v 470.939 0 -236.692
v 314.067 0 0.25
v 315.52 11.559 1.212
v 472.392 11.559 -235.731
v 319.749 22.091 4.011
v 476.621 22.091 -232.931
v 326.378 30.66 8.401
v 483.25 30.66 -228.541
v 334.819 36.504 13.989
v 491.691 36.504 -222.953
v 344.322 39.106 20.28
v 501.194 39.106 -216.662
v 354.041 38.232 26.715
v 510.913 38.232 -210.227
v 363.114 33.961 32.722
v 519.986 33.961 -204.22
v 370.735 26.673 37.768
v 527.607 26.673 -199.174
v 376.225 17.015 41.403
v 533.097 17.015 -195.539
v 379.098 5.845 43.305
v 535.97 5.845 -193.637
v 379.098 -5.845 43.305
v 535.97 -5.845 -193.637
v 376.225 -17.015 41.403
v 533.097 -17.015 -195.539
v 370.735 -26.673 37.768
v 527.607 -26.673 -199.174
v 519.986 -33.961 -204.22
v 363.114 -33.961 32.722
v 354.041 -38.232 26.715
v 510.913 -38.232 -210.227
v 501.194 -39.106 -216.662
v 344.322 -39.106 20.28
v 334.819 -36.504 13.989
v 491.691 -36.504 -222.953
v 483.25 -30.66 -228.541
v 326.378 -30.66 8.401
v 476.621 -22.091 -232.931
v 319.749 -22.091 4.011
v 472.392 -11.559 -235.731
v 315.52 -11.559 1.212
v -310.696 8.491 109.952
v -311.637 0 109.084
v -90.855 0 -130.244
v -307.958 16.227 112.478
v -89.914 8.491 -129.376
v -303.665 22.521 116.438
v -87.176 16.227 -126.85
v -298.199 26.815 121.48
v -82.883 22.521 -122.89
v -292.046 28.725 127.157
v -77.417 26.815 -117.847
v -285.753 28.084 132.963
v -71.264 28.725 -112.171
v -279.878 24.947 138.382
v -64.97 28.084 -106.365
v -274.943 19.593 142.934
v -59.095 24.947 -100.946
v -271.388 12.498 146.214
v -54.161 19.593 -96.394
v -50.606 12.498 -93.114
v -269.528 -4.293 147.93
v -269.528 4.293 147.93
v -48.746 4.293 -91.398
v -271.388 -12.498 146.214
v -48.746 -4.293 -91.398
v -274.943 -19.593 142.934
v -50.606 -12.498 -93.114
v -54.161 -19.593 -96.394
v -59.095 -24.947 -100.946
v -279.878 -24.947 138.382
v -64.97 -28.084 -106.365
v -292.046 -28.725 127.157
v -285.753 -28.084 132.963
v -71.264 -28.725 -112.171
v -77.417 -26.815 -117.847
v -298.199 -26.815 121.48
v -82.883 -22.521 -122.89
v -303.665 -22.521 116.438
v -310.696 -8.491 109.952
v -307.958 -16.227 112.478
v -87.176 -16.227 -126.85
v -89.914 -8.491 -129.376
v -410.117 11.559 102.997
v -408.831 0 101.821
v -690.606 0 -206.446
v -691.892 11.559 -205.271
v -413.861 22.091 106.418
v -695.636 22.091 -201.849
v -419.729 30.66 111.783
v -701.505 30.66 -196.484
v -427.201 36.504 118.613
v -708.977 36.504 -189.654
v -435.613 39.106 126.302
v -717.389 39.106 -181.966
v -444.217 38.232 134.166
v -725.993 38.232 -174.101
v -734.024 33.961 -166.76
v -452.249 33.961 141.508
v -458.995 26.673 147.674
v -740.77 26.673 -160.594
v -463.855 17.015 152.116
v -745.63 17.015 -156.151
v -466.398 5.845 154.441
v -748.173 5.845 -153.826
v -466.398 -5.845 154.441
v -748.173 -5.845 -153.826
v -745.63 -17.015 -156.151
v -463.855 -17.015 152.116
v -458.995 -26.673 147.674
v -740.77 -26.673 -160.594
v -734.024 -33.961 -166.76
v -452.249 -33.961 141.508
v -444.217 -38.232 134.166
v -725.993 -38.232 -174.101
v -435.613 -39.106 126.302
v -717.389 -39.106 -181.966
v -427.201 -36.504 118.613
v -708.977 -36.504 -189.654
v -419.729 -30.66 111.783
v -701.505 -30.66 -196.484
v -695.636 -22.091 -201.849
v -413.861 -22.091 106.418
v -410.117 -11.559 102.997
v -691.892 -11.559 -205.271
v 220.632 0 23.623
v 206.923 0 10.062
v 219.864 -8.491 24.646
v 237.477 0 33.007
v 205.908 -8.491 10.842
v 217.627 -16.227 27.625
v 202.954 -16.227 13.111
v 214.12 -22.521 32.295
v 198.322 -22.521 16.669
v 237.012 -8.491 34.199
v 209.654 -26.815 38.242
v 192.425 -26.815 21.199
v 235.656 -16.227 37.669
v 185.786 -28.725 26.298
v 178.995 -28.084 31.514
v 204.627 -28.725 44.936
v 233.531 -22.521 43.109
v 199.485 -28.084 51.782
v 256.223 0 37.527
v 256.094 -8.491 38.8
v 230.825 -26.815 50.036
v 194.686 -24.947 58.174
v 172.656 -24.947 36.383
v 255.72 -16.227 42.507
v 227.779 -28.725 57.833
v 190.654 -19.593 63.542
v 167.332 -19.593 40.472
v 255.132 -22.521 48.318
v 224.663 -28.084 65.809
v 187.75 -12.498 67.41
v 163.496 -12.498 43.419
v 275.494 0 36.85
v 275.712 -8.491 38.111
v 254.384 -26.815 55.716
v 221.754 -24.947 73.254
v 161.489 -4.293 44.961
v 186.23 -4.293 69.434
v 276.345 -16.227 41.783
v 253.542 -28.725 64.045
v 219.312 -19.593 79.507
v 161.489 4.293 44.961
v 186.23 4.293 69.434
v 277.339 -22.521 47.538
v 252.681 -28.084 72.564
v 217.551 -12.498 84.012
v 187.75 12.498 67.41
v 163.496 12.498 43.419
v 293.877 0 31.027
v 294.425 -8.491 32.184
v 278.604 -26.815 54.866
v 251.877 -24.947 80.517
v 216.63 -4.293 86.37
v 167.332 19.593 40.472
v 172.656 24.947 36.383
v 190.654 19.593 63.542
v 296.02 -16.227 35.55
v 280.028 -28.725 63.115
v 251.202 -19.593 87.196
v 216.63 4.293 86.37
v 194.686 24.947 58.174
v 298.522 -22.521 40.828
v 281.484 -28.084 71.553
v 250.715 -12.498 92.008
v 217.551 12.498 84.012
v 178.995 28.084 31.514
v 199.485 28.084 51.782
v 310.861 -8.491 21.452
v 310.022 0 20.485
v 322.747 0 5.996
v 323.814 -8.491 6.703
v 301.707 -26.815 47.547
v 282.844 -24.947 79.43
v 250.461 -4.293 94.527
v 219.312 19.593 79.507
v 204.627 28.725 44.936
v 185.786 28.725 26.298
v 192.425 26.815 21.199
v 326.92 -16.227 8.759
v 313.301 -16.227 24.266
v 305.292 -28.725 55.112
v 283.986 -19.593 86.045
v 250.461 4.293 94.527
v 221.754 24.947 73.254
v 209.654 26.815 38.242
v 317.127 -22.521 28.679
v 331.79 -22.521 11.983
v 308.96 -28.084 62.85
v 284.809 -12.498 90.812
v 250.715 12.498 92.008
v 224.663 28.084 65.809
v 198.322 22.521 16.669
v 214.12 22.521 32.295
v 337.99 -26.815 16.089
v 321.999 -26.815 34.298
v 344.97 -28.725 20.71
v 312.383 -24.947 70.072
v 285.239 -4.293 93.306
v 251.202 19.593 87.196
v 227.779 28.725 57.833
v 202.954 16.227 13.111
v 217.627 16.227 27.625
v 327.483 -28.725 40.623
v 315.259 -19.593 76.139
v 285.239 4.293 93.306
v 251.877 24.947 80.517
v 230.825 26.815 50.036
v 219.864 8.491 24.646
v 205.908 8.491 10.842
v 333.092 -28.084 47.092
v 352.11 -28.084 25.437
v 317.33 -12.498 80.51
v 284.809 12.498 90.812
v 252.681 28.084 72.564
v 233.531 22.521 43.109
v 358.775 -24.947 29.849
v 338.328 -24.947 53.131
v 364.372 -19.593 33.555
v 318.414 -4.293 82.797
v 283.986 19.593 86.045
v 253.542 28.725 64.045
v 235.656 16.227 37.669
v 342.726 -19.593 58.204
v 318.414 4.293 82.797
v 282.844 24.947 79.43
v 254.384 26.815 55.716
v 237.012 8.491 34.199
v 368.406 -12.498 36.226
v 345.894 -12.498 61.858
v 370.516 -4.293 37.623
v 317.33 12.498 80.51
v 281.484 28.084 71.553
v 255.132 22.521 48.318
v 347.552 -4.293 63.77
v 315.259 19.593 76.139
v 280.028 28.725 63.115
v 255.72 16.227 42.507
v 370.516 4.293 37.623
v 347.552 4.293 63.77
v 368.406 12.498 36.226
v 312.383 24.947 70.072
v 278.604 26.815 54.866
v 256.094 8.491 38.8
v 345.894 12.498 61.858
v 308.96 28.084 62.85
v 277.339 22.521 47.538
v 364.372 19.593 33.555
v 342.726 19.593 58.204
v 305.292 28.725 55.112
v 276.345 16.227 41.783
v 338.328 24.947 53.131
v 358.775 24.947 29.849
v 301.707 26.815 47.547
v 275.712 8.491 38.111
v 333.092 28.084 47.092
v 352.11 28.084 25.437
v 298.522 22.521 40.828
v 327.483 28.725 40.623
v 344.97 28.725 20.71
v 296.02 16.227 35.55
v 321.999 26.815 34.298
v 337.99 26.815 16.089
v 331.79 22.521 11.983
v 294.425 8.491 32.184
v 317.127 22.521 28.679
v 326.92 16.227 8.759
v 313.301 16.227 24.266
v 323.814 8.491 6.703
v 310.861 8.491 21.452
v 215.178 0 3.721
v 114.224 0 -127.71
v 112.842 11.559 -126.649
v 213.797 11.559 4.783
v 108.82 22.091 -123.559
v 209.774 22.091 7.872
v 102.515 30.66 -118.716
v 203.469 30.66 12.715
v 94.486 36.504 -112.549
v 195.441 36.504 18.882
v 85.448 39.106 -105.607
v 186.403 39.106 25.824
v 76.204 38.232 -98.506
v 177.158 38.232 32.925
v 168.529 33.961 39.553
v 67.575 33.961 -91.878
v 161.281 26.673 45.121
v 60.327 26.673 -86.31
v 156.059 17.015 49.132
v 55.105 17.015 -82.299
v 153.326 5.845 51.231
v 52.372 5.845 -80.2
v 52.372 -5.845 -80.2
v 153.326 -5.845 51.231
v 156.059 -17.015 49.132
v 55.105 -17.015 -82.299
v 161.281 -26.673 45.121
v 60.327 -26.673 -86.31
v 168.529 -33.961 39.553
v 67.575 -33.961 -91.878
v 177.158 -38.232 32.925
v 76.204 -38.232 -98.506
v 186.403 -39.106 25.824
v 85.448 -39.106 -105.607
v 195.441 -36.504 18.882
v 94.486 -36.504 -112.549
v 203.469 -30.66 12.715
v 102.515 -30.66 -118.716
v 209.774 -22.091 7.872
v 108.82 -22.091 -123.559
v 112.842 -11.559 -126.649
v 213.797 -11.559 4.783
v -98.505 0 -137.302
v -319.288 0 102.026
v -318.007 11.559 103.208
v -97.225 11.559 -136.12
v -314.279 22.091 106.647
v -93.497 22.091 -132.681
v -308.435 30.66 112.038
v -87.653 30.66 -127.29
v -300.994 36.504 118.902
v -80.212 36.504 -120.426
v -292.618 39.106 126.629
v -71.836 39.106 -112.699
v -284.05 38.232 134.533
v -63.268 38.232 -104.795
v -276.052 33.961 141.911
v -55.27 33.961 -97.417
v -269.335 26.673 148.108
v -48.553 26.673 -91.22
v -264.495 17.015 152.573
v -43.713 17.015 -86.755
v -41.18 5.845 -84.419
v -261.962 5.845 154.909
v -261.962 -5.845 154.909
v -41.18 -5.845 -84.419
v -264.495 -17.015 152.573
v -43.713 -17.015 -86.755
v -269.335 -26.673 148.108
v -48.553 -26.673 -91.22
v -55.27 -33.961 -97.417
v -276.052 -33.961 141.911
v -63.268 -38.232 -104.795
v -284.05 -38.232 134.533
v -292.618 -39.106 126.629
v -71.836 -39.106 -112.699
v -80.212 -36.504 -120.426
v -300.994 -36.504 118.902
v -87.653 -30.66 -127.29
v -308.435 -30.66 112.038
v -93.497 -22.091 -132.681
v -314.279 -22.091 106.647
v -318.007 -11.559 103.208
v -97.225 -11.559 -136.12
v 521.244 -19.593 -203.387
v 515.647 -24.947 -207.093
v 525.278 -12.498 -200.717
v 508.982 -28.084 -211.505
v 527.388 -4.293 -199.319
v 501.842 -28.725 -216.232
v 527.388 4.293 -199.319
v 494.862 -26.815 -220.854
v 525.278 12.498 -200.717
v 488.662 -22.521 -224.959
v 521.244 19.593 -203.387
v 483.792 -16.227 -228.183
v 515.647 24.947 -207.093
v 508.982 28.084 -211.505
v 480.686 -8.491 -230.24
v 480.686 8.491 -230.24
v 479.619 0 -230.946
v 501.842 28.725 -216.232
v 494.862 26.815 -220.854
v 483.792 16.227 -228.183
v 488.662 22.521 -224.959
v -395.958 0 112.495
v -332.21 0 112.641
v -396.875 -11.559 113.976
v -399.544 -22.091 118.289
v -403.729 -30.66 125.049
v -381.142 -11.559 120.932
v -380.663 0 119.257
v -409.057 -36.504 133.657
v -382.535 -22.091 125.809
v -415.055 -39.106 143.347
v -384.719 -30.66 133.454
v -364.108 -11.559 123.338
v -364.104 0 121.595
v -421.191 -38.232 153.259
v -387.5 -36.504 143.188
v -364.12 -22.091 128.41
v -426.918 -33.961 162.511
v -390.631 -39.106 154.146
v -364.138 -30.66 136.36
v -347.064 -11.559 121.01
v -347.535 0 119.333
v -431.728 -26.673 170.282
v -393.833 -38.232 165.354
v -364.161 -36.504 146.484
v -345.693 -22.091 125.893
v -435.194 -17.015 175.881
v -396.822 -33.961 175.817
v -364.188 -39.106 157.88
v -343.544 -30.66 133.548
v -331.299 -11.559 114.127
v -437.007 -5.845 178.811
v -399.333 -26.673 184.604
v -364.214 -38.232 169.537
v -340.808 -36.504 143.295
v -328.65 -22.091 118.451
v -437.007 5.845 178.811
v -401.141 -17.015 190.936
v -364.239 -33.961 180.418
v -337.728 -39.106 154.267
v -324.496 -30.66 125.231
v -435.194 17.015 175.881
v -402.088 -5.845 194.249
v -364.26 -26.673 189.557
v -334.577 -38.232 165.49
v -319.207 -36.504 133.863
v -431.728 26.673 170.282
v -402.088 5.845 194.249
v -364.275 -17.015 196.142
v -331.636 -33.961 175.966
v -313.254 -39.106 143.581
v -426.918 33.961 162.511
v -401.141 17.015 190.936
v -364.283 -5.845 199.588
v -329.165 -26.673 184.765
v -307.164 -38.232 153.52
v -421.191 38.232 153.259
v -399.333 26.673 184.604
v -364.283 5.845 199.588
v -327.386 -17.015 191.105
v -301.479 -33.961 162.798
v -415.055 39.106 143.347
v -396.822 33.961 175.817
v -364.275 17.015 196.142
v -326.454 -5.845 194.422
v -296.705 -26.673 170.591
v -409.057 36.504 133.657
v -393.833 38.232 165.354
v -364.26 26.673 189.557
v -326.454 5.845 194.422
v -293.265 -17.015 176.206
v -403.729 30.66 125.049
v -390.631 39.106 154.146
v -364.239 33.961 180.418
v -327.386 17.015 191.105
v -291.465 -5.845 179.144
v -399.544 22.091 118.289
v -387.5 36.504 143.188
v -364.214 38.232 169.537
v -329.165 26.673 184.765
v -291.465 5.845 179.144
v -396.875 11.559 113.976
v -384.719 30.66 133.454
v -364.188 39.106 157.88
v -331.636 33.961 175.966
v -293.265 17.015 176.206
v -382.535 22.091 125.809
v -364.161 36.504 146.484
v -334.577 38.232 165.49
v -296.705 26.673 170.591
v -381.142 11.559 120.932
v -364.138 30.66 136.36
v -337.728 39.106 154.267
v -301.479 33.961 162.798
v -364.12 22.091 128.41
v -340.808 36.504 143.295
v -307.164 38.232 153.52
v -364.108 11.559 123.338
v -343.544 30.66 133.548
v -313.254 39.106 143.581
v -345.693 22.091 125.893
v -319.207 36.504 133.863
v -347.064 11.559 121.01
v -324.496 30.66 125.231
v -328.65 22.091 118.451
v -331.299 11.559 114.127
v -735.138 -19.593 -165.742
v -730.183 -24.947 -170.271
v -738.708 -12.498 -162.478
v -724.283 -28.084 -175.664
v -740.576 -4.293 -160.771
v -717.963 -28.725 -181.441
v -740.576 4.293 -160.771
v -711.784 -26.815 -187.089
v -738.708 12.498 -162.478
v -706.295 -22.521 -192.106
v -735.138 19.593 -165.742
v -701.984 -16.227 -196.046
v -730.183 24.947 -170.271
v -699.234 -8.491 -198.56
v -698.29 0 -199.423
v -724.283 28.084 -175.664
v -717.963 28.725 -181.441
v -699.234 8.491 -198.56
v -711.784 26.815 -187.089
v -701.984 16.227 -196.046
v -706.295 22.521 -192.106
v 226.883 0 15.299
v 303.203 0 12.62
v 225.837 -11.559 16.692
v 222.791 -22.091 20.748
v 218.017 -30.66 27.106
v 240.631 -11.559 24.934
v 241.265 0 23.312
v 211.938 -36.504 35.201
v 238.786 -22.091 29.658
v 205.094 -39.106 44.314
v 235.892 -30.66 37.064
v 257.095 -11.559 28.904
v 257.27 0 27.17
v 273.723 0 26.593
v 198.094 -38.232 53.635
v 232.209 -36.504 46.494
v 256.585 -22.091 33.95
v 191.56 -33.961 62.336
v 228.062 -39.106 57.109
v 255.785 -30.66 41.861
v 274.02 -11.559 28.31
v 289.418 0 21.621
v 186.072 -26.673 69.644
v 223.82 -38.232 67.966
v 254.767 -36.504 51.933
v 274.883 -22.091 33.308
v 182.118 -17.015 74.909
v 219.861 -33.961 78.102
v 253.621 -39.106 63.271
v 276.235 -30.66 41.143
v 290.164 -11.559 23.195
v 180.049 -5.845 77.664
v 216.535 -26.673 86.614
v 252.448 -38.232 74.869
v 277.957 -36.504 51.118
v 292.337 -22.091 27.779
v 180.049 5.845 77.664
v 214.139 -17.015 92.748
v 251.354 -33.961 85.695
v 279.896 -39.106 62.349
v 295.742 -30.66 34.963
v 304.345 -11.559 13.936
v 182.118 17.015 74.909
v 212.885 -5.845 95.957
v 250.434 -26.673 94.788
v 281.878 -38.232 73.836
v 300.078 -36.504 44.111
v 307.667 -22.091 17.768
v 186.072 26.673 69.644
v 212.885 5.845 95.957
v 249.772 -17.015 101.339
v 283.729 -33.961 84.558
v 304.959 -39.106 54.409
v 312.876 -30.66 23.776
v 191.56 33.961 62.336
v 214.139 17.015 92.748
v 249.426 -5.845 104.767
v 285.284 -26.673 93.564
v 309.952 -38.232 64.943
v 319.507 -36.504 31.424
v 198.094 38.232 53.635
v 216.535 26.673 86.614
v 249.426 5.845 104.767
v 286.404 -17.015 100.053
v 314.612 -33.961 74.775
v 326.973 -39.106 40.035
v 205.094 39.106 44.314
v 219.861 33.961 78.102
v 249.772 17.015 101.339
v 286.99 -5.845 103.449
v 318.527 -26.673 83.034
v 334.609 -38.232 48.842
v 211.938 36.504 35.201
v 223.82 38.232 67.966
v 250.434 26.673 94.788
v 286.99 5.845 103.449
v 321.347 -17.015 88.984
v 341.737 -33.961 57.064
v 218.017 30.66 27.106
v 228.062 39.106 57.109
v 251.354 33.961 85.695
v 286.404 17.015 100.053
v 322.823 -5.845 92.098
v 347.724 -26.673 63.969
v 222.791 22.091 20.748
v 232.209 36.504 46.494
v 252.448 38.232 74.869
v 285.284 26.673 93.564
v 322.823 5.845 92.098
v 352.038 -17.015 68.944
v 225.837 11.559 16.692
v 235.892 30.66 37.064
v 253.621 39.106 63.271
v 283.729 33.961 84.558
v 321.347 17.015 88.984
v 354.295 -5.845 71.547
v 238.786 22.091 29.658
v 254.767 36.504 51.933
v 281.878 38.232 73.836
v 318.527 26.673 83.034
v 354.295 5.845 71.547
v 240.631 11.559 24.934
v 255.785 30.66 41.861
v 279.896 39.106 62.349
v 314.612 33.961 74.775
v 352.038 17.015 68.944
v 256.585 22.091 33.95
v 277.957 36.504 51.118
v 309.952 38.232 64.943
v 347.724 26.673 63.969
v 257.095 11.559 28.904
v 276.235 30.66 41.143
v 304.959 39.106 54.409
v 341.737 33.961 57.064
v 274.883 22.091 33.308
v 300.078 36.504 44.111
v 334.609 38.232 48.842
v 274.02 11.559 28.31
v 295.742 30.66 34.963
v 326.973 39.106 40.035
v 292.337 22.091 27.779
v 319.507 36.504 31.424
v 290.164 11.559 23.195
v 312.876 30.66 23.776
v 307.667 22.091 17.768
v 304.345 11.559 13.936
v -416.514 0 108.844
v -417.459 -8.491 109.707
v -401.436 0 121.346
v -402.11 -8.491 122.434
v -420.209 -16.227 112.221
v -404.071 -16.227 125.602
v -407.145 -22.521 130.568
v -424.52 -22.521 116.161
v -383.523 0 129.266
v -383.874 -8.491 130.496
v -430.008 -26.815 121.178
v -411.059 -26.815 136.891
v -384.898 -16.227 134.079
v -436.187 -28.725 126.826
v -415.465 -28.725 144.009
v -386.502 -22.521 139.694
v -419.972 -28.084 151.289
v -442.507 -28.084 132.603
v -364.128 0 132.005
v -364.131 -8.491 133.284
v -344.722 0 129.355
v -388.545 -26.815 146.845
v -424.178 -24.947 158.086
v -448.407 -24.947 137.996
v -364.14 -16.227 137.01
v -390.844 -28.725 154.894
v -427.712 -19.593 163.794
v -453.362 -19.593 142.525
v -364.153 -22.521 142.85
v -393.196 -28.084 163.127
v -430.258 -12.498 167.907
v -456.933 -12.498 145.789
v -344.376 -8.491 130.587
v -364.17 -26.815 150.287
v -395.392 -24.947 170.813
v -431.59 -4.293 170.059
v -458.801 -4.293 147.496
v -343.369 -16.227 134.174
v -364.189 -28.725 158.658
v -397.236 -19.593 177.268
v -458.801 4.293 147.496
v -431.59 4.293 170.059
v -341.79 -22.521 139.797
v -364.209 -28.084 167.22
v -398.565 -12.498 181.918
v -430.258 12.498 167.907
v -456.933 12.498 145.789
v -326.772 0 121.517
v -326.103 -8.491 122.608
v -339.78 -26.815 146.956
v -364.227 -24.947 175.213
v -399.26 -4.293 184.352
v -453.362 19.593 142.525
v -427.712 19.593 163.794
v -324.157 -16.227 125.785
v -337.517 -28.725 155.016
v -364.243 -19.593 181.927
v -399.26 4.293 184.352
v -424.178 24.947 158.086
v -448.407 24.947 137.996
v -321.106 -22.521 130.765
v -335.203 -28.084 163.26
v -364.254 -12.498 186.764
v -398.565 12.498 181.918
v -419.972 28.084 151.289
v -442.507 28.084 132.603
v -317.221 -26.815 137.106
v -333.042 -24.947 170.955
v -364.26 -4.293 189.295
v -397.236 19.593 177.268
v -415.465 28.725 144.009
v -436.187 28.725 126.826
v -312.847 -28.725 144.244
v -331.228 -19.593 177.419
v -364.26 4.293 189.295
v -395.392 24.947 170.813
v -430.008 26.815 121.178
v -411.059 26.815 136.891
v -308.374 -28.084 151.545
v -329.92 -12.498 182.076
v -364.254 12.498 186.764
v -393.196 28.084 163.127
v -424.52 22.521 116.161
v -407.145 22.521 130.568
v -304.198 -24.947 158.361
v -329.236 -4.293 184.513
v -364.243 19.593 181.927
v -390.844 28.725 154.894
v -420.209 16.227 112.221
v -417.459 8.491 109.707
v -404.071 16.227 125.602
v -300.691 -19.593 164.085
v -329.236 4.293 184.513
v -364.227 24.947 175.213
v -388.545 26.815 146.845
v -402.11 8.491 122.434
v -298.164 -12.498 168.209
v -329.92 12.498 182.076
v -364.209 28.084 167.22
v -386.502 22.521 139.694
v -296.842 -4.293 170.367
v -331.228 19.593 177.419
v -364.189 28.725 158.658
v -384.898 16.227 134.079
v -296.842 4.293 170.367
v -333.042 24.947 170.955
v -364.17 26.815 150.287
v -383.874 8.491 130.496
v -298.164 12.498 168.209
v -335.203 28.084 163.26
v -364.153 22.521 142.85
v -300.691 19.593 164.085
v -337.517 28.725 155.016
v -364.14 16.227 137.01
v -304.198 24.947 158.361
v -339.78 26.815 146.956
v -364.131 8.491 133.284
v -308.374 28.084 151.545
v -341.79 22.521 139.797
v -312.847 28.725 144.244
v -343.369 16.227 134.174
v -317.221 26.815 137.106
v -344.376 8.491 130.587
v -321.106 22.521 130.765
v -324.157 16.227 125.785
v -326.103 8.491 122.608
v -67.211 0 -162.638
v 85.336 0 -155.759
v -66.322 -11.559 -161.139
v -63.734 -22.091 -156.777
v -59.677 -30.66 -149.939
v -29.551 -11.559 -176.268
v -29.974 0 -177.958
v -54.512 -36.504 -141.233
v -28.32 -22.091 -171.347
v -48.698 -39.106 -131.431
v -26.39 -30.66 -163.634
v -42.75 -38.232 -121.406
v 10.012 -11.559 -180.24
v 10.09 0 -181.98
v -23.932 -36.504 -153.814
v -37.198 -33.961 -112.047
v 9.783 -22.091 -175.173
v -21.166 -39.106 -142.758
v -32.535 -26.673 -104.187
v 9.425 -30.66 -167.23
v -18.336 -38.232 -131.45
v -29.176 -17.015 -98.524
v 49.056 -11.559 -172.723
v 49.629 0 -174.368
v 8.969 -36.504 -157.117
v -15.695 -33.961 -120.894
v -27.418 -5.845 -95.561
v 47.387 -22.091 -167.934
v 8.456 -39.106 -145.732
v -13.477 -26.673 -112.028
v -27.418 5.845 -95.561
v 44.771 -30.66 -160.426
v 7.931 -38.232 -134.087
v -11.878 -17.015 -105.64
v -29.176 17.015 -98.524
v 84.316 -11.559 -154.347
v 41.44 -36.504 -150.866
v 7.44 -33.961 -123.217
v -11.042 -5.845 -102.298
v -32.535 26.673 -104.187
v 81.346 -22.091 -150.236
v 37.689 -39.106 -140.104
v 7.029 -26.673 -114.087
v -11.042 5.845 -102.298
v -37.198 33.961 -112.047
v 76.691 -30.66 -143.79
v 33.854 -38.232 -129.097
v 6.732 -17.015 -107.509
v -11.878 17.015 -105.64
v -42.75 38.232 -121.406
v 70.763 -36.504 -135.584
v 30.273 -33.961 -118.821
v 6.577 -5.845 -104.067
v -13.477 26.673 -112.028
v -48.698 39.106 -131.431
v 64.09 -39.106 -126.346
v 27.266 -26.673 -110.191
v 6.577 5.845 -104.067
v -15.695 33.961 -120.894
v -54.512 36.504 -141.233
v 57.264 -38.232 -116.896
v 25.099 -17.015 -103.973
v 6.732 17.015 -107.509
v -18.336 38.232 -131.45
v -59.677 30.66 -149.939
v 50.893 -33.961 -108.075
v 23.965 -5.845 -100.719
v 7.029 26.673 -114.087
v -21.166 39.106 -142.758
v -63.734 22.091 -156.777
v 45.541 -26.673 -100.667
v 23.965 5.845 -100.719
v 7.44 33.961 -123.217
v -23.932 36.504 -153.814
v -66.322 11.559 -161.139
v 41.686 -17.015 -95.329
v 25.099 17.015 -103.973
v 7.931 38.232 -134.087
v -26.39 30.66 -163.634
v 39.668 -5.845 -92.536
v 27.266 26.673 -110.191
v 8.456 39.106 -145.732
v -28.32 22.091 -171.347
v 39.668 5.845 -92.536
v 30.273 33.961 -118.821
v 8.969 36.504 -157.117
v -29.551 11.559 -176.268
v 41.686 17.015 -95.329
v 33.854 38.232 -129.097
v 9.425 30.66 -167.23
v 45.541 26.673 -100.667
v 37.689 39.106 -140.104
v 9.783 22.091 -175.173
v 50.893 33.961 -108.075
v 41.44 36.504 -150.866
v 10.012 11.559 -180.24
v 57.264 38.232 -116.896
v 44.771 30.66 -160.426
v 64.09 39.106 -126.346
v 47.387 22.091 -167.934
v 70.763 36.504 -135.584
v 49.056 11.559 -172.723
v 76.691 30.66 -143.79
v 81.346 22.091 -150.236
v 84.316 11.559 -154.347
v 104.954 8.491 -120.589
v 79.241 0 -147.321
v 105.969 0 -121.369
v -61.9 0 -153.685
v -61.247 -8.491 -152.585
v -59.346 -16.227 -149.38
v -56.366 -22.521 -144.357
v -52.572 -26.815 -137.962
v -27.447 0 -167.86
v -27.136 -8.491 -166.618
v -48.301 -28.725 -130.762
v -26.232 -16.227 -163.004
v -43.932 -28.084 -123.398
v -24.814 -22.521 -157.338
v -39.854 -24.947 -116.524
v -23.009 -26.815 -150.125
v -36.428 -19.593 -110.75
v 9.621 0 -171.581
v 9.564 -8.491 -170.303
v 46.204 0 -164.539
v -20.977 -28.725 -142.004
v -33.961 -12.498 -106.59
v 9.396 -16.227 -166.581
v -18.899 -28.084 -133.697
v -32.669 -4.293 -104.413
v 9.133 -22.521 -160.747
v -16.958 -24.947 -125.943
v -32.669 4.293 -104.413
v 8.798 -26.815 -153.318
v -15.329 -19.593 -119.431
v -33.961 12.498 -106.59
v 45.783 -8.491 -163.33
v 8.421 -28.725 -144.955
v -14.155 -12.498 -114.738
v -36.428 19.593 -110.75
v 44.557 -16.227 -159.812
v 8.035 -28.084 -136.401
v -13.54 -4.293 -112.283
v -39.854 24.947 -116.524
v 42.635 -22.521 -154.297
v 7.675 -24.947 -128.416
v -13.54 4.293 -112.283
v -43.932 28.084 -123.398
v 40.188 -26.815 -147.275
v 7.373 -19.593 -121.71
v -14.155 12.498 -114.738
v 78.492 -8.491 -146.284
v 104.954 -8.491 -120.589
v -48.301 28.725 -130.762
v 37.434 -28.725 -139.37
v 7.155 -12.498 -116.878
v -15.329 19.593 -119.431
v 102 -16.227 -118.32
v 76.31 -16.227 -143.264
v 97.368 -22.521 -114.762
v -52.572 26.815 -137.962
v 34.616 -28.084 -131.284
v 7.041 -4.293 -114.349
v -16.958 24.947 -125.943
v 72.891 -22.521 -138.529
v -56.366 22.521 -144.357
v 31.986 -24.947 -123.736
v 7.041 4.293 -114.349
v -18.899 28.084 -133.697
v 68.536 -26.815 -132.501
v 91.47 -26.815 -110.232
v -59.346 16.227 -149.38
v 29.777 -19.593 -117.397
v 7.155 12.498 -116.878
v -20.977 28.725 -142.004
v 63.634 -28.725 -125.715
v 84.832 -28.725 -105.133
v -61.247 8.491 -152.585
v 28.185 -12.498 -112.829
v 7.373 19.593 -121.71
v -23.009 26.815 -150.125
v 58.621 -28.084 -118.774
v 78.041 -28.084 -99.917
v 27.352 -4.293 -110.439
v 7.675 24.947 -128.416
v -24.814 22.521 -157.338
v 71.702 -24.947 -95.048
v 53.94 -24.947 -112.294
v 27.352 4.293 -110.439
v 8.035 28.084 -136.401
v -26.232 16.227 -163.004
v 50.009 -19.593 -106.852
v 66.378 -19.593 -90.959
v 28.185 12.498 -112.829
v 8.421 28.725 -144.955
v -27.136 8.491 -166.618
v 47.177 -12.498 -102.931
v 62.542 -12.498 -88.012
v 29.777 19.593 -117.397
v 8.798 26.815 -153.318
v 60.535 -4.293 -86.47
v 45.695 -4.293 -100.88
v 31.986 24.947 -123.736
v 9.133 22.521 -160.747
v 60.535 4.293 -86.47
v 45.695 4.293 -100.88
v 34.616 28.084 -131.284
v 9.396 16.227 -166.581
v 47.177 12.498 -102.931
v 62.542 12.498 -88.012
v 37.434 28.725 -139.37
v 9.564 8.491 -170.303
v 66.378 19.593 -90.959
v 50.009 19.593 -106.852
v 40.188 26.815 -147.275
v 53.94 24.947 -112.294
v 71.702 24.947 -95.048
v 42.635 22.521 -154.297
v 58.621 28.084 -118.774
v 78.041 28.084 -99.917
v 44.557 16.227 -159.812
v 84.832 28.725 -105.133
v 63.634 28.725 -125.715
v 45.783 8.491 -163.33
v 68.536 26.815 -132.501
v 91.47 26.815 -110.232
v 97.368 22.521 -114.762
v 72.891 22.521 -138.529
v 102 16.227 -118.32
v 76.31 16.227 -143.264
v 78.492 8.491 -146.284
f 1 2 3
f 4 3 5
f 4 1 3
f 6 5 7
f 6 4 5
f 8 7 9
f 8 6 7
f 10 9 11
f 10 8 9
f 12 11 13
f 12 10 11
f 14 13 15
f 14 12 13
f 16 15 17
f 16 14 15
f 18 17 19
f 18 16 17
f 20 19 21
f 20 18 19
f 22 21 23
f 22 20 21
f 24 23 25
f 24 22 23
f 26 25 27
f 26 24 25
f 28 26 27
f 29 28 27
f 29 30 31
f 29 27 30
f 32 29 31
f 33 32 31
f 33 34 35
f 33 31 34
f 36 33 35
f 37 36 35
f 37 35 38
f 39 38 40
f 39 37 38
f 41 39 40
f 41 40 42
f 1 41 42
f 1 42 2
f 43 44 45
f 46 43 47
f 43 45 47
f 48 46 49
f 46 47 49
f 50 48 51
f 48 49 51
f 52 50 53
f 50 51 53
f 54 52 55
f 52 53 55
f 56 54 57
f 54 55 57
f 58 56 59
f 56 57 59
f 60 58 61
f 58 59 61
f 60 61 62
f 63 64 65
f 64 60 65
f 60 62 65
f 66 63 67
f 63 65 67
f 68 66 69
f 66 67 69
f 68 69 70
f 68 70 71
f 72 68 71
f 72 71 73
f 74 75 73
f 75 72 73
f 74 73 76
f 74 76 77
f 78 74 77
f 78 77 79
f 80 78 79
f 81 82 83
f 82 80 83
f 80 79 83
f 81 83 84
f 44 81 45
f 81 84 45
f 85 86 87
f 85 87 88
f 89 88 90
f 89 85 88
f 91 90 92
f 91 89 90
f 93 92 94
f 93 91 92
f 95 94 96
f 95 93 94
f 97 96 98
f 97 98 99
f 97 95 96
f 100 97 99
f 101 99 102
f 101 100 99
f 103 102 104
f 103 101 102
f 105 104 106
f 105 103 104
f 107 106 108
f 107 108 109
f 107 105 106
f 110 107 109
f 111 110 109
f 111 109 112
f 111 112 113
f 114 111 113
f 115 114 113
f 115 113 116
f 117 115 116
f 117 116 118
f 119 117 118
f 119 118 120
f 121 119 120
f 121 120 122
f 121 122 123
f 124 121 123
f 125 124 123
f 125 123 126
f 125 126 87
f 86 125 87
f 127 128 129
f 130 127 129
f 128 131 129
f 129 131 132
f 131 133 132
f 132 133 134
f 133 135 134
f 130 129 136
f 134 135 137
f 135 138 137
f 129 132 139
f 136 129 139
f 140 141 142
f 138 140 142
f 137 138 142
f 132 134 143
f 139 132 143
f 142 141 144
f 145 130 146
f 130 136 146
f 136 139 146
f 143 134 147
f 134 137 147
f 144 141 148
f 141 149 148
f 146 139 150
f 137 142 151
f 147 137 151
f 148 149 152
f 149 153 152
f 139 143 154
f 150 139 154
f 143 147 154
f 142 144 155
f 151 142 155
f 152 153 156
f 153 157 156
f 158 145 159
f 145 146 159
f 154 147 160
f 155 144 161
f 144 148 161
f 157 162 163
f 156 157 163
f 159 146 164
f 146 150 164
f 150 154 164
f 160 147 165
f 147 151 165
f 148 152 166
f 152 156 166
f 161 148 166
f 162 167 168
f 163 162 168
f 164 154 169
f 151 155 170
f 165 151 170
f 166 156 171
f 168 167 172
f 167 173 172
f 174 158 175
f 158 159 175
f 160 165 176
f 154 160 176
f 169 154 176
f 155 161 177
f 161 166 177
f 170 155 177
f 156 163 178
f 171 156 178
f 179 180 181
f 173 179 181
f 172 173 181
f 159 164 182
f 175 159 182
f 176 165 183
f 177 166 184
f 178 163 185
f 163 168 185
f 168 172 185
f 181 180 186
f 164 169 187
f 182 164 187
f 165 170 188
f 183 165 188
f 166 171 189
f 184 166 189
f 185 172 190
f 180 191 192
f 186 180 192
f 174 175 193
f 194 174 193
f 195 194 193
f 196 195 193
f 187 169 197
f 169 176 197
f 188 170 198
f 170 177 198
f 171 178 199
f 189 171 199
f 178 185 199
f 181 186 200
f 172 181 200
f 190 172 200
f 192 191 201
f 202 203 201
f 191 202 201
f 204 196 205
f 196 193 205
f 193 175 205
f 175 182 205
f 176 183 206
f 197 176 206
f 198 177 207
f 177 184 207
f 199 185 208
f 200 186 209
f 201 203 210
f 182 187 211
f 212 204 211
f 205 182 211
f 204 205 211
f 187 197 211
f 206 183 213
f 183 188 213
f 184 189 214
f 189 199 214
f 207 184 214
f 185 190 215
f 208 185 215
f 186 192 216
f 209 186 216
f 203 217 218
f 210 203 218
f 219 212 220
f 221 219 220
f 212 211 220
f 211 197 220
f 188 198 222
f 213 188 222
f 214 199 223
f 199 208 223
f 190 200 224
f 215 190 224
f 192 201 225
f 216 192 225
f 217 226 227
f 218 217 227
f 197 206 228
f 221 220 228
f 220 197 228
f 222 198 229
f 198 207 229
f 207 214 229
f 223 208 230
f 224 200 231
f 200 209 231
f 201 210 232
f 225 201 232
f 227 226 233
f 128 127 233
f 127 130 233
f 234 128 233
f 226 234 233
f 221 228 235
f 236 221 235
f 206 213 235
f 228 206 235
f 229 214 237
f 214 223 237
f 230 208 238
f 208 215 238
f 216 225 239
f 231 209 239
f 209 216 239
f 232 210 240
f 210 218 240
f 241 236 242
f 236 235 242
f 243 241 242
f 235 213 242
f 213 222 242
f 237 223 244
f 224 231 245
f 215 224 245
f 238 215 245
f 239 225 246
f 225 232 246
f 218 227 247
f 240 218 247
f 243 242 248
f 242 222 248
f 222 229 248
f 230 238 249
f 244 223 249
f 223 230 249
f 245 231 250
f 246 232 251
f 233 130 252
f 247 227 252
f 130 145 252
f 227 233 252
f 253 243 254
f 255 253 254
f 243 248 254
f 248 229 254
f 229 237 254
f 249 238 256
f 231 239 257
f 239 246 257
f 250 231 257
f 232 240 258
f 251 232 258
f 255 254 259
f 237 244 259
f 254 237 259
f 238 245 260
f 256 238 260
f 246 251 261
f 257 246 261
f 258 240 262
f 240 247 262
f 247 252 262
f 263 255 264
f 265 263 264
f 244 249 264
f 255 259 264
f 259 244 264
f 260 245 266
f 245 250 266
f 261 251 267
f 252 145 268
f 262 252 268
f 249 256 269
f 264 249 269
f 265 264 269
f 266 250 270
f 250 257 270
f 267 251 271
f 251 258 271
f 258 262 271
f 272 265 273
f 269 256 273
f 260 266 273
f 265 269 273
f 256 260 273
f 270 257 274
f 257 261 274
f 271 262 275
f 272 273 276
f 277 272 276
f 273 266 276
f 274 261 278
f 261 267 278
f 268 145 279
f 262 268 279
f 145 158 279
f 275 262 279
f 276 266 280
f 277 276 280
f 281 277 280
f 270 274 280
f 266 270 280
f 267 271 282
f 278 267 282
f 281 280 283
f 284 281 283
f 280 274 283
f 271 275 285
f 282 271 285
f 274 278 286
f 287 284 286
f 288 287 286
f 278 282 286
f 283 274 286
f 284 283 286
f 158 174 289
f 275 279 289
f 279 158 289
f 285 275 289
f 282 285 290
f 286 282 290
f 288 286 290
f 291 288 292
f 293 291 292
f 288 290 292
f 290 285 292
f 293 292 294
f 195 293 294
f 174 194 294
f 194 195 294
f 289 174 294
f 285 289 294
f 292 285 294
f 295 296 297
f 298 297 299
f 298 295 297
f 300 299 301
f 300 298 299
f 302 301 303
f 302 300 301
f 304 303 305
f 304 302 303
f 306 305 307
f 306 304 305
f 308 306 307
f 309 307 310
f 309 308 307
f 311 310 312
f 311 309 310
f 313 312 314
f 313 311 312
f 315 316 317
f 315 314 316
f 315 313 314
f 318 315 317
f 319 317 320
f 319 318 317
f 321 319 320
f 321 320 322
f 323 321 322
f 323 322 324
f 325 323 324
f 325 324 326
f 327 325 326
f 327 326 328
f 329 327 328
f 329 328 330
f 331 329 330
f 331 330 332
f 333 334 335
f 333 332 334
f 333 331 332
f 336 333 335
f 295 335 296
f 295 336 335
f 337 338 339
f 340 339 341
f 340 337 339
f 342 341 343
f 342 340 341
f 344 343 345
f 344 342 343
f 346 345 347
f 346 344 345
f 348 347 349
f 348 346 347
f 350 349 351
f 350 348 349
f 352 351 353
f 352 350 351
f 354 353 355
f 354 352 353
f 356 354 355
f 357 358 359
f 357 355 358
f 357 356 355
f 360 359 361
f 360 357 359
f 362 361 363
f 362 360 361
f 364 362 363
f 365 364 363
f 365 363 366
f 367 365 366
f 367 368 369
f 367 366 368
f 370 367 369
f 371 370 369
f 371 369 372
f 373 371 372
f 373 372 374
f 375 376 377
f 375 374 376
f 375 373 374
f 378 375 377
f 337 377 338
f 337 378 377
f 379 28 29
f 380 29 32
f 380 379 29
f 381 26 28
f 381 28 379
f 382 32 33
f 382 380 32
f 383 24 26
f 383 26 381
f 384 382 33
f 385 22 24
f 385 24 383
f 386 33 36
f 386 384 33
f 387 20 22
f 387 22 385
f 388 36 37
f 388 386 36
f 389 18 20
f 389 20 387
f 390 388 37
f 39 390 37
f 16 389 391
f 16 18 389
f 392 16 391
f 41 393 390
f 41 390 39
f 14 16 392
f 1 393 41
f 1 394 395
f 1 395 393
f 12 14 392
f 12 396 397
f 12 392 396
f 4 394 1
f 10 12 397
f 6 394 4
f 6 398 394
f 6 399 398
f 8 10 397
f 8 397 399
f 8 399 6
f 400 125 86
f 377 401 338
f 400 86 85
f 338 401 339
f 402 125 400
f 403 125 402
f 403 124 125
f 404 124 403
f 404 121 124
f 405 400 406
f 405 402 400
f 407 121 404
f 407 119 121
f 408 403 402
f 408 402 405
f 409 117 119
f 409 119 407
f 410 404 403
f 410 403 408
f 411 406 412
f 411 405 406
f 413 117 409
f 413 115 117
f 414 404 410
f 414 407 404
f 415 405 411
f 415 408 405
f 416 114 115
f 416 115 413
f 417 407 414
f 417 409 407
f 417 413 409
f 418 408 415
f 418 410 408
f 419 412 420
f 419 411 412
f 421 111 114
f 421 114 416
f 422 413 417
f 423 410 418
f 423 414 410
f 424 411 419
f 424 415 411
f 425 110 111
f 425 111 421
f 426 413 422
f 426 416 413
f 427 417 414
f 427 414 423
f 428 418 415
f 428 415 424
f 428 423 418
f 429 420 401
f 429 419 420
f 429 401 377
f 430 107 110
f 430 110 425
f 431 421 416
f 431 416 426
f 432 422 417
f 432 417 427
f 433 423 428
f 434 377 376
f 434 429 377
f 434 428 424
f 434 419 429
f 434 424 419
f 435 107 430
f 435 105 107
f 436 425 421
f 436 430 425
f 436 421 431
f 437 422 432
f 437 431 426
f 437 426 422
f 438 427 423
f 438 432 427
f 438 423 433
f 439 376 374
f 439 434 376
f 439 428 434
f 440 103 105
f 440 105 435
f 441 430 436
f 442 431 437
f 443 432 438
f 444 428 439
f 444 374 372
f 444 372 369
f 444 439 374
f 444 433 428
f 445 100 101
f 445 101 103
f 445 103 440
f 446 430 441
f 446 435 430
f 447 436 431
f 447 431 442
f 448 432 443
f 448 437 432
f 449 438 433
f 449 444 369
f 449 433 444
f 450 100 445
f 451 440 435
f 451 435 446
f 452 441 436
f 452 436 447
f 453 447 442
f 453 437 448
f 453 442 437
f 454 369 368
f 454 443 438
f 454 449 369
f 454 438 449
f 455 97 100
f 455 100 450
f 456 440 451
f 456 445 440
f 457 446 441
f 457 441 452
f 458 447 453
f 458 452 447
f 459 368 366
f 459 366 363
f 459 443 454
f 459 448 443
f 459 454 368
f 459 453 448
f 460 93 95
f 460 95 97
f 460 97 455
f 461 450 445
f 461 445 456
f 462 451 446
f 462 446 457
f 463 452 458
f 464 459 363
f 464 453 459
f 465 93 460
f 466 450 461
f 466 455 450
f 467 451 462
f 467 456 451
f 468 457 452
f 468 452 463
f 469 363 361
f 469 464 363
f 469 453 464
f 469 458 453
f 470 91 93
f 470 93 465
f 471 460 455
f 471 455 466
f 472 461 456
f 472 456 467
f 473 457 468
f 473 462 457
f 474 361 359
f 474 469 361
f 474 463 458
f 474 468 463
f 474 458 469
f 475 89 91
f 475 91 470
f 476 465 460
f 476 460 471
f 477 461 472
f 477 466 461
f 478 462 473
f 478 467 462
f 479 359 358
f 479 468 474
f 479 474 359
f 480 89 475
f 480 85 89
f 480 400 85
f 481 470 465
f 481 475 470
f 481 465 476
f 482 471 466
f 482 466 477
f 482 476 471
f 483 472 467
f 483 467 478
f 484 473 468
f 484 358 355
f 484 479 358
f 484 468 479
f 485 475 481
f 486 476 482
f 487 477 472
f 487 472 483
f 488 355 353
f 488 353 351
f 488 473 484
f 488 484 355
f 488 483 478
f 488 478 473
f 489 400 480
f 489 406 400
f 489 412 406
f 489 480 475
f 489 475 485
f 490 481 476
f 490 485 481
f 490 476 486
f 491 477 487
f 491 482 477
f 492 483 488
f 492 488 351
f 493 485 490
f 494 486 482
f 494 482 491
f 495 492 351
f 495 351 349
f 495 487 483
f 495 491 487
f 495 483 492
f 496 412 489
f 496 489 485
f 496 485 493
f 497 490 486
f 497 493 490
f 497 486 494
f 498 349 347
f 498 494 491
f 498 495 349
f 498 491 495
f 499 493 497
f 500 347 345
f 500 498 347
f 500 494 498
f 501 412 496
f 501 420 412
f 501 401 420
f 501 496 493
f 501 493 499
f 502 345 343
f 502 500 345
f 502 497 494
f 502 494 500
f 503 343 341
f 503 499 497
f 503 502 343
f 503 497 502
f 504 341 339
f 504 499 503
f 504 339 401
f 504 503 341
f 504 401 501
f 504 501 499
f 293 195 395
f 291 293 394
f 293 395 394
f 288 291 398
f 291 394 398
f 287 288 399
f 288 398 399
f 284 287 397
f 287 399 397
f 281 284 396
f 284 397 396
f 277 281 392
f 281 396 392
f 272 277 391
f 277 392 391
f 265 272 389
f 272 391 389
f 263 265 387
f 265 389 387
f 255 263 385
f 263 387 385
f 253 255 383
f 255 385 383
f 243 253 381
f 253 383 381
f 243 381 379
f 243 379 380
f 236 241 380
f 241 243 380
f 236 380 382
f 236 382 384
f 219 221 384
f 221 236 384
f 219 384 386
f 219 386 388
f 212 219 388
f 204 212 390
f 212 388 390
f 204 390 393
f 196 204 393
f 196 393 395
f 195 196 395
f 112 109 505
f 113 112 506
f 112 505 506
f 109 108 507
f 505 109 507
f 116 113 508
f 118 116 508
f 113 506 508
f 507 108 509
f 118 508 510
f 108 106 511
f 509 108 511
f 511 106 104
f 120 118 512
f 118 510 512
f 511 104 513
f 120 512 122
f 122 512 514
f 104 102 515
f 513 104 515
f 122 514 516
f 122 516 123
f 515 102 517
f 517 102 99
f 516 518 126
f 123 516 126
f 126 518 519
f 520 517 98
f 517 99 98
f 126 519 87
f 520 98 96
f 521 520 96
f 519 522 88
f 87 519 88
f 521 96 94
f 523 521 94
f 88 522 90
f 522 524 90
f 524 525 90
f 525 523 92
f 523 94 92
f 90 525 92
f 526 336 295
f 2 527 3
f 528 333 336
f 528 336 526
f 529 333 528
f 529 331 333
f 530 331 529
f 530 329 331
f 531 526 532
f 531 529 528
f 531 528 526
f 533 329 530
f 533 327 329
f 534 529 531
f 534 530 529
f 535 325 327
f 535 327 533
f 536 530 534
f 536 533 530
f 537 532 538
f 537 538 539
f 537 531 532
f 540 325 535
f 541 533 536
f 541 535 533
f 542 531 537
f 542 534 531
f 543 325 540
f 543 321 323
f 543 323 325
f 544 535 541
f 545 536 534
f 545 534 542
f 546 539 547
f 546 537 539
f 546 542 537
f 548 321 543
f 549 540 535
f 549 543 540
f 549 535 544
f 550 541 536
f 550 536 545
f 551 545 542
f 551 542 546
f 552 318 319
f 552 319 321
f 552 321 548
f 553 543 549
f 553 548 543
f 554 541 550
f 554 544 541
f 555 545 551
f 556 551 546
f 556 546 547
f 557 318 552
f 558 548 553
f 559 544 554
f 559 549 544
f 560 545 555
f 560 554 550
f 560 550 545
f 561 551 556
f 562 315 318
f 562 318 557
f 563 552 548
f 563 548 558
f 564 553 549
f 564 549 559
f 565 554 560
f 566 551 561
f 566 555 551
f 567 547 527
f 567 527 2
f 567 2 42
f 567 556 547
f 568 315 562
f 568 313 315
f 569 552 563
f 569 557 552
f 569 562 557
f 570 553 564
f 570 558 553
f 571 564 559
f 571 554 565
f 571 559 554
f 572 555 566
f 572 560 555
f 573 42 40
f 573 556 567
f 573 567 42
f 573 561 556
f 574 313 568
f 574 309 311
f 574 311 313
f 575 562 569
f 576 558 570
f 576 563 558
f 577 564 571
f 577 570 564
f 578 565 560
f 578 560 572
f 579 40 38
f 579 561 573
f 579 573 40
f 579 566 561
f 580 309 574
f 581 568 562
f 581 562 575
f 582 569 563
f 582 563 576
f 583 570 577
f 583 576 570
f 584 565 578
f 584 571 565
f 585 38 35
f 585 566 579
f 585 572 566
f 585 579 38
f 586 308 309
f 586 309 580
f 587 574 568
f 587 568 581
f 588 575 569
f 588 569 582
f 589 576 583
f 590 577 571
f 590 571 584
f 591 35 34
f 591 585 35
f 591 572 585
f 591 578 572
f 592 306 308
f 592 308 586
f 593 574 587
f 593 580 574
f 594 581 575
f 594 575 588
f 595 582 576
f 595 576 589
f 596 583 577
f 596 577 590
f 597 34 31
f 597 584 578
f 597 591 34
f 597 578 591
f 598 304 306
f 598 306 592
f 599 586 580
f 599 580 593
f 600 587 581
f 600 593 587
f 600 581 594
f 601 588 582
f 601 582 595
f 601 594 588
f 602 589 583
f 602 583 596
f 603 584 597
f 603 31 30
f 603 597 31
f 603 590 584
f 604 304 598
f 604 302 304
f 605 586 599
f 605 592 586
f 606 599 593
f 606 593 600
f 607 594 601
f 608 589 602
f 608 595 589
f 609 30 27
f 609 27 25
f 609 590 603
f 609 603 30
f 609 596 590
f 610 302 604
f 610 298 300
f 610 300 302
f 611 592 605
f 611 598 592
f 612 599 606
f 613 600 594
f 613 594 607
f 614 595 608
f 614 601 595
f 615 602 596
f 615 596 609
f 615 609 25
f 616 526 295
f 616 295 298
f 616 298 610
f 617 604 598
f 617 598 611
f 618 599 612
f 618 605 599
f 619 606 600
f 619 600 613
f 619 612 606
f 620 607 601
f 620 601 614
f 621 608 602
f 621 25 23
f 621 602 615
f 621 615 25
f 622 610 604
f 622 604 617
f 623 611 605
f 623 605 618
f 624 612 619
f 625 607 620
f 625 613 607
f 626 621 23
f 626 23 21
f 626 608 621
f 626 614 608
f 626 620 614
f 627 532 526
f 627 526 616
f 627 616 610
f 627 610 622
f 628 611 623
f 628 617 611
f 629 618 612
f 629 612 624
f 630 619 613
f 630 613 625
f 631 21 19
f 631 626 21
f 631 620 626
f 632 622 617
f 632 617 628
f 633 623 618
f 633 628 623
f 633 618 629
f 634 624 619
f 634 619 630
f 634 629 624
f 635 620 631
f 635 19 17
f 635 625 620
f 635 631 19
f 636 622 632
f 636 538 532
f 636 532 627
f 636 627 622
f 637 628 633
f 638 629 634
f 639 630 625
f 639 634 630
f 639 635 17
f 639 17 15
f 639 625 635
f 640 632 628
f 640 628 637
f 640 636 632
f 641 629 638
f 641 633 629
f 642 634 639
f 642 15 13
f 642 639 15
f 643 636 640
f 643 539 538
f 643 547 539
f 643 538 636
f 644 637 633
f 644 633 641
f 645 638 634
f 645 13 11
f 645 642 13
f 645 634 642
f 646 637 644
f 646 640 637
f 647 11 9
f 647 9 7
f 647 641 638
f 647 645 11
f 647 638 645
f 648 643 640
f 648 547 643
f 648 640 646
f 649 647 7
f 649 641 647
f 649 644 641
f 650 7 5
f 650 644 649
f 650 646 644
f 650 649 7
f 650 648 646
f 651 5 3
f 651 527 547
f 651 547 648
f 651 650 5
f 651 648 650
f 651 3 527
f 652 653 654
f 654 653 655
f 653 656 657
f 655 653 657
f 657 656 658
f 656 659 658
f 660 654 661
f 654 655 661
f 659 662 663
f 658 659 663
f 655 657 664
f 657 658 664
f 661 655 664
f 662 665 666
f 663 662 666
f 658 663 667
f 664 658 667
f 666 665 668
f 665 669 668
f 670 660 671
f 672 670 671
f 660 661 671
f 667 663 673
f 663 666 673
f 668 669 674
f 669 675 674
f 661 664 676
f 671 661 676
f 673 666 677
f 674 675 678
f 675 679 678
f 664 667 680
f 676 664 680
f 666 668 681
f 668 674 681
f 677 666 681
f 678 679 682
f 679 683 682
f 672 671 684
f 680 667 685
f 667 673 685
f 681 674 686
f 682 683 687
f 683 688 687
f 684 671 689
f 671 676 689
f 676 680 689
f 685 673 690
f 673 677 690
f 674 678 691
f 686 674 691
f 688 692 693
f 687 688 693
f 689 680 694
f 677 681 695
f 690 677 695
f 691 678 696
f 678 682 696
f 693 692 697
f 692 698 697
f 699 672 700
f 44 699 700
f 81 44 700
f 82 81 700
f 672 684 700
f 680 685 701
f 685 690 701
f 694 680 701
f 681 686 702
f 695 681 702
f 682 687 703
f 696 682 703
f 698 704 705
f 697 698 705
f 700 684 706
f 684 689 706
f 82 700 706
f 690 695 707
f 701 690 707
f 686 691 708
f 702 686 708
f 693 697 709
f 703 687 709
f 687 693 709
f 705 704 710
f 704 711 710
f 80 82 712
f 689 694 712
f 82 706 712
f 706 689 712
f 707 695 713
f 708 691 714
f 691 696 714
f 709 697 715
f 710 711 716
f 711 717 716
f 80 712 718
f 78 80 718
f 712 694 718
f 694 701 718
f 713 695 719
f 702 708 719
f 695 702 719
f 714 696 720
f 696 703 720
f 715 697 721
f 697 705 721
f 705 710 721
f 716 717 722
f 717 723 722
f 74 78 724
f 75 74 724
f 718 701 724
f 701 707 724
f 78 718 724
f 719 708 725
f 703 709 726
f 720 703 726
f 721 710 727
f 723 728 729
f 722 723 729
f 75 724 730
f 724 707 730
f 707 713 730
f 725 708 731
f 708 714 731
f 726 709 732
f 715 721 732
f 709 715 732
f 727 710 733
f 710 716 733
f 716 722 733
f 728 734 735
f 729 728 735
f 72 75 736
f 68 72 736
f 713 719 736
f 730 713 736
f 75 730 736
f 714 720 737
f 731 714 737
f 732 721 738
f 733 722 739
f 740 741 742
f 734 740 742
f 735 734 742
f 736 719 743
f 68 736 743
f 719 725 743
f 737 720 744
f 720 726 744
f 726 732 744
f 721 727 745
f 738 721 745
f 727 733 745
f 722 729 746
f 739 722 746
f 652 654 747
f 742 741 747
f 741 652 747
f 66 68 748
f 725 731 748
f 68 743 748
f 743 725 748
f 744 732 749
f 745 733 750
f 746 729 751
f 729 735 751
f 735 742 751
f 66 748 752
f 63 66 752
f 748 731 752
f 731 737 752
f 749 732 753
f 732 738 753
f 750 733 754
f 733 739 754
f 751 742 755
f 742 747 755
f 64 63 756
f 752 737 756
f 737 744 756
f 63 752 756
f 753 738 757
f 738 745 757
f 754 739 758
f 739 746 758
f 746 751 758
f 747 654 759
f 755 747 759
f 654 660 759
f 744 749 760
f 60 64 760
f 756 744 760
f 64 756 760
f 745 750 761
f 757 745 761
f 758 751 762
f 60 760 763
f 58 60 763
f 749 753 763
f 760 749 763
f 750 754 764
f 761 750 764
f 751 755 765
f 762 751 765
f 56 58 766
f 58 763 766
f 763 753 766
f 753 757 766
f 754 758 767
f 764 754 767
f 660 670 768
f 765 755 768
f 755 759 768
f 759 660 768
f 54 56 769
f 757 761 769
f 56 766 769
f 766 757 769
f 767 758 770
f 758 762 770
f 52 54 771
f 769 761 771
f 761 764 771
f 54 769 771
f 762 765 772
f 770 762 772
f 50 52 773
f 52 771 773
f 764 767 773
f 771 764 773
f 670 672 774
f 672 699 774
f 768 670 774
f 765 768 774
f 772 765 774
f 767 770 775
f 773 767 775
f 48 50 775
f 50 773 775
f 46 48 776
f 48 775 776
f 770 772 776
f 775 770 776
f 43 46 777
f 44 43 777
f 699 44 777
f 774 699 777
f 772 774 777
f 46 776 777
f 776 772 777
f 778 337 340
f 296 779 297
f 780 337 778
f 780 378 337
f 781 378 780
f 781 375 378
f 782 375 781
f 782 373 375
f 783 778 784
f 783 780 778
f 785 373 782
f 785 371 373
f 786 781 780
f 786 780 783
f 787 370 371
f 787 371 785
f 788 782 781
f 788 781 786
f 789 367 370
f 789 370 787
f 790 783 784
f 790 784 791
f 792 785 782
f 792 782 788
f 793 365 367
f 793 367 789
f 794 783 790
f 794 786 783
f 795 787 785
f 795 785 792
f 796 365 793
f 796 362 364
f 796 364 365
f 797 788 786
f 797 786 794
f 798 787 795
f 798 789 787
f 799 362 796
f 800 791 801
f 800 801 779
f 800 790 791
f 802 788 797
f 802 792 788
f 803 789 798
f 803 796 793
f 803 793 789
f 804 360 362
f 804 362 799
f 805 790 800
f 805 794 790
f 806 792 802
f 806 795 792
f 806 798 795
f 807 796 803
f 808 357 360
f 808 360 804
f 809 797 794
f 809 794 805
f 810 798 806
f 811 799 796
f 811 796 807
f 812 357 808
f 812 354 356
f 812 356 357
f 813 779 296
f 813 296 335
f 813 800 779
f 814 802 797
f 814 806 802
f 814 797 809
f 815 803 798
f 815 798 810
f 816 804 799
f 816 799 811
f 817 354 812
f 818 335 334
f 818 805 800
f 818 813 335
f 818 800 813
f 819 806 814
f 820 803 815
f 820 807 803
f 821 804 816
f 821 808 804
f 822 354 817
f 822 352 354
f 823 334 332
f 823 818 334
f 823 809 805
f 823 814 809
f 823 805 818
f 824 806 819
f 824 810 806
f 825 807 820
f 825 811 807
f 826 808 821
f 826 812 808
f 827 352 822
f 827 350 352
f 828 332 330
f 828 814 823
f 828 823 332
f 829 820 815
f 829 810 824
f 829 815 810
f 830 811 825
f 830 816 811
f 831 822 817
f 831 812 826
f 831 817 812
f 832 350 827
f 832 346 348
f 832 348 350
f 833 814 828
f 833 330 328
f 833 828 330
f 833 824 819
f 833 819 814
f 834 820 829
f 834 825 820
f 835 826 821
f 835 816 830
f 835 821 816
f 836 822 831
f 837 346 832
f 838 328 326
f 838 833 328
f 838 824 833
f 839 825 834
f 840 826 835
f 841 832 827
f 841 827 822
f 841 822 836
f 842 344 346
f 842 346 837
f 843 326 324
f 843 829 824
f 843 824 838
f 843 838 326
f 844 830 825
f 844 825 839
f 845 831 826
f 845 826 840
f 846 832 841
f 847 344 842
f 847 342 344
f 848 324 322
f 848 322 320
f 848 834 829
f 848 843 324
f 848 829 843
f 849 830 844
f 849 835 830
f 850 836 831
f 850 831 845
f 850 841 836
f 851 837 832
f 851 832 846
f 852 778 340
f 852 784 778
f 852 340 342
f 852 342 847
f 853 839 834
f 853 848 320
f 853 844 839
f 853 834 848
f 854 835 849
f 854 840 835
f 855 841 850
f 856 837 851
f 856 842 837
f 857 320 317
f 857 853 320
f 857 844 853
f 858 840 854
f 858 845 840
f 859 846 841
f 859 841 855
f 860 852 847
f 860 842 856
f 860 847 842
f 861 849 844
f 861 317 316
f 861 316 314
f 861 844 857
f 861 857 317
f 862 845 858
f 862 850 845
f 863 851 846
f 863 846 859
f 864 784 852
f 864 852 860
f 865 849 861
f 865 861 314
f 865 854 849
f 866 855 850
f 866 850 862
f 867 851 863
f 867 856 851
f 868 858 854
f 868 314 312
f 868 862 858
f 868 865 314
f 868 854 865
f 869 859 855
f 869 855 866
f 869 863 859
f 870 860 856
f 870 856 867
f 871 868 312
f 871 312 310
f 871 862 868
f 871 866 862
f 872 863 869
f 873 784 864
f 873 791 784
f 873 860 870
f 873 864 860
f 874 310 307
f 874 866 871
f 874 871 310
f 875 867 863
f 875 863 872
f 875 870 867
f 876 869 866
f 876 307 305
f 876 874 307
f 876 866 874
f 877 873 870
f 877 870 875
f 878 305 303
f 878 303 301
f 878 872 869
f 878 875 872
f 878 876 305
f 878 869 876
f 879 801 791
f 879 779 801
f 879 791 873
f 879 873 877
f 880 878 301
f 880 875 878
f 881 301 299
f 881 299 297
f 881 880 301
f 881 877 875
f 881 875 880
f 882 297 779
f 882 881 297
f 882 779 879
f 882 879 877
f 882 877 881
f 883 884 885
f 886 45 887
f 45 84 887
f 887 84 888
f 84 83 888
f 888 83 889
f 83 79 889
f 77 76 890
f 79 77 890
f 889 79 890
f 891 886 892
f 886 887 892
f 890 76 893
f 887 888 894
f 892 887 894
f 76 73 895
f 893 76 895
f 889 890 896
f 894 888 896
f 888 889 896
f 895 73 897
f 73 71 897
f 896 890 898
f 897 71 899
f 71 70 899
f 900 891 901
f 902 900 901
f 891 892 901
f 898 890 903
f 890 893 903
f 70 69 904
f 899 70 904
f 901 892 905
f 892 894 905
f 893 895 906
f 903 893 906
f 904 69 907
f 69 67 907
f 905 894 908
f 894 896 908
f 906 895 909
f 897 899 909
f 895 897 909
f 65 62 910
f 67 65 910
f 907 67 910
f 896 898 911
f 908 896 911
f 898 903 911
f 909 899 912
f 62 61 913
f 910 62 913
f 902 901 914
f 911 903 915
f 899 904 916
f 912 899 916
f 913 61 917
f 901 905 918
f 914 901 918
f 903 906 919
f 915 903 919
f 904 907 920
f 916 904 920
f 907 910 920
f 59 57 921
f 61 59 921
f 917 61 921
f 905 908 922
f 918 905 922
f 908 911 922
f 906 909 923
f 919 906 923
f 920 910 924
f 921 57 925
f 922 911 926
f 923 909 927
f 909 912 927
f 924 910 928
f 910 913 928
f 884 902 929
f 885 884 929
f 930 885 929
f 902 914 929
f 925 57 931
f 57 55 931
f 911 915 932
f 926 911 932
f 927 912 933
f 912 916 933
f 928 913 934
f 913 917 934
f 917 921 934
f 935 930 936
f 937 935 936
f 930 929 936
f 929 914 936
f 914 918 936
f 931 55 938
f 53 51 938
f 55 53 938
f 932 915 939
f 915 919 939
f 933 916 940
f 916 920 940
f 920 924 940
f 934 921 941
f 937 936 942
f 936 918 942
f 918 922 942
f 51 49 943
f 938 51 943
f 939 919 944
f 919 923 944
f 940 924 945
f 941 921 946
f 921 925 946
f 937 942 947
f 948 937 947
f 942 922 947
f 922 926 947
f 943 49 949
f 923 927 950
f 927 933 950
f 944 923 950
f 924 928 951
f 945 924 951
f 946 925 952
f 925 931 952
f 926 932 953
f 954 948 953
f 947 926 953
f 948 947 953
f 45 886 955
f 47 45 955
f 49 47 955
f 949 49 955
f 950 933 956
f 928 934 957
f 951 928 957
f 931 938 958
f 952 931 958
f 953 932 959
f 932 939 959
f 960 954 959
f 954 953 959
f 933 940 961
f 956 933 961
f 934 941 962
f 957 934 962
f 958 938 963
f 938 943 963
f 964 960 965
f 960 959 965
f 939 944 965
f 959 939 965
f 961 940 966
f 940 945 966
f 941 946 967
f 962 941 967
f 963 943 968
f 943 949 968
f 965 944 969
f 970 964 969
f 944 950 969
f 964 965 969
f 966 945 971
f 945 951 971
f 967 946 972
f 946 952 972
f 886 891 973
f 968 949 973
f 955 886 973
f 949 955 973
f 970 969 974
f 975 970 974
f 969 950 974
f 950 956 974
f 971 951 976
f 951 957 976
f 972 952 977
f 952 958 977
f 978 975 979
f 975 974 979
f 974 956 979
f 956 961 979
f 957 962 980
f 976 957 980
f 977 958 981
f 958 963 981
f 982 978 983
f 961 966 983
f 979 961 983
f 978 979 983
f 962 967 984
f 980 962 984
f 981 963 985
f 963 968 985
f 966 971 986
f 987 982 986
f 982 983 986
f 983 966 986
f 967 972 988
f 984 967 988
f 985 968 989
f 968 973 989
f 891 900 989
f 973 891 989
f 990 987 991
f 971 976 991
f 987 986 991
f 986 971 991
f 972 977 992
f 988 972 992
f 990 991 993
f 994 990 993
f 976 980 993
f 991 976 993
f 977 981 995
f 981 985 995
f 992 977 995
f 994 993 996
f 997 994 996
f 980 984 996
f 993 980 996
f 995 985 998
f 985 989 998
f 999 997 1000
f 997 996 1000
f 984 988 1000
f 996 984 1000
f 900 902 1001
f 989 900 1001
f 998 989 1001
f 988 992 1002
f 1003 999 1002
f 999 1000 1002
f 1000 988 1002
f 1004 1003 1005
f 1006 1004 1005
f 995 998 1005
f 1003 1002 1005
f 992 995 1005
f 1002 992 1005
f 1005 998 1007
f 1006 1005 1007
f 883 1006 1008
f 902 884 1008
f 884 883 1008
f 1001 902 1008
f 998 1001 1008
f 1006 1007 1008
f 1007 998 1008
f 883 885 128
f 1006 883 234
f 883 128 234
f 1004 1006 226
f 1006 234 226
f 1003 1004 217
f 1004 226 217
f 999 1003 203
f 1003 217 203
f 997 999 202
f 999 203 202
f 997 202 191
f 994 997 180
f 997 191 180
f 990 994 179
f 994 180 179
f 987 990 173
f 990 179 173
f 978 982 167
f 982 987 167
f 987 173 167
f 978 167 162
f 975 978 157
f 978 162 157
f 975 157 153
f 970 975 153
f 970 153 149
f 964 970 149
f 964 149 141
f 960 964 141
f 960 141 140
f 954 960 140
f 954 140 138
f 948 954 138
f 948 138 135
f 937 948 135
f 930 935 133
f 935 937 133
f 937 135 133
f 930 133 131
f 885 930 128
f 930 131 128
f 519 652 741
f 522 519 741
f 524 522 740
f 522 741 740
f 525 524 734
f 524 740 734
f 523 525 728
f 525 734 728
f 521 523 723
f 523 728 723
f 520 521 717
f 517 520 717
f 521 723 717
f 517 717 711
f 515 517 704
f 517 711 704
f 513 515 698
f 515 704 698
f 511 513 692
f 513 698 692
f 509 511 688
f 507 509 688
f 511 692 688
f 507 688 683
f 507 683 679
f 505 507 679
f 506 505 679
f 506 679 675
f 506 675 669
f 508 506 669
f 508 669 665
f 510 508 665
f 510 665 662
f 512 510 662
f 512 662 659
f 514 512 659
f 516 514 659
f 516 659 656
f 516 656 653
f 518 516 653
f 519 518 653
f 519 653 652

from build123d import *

# Parameters (mm, degrees)
F2_R   = 39.2151762462
F2_R_2 = 28.8059815355


with BuildPart() as f3:
    # F3: sweep along a path in F0
    with BuildLine(Plane.XZ) as f3_path:
        Line((-719.5516228676, -179.9883693457), (-437.7762410733, 128.2787399033))
        ThreePointArc((-437.7762410733, 128.2787399033), (-364.1942794588, 160.8105350061), (-290.4640128191, 128.6162723358))
        Line((-290.4640128191, 128.6162723358), (-69.6818247618, -110.7116367356))
        ThreePointArc((-69.6818247618, -110.7116367356), (8.3236890435, -142.8046634751), (83.1244208225, -103.8216790503))
        Line((83.1244208225, -103.8216790503), (184.0787292704, 27.6093990153))
        ThreePointArc((184.0787292704, 27.6093990153), (266.8922170539, 66.6323191878), (346.7653781049, 21.8982136153))
        Line((346.7653781049, 21.8982136153), (503.6373805534, -215.0438748717))
    # F2 (on line) → F3 (sweep)
    with BuildSketch(Plane(origin=(-417.1664648881, 0, -456.3872804919), x_dir=(0.7381108825, 0, -0.674679424), z_dir=(0.674679424, 0, 0.7381108825))):
        with Locations((-409.6744339706, 0)):
            Circle(F2_R)
        with Locations((-409.6744339706, 0)):
            Circle(F2_R_2, mode=Mode.SUBTRACT)
    sweep(path=f3_path.line)


solid = f3.part
